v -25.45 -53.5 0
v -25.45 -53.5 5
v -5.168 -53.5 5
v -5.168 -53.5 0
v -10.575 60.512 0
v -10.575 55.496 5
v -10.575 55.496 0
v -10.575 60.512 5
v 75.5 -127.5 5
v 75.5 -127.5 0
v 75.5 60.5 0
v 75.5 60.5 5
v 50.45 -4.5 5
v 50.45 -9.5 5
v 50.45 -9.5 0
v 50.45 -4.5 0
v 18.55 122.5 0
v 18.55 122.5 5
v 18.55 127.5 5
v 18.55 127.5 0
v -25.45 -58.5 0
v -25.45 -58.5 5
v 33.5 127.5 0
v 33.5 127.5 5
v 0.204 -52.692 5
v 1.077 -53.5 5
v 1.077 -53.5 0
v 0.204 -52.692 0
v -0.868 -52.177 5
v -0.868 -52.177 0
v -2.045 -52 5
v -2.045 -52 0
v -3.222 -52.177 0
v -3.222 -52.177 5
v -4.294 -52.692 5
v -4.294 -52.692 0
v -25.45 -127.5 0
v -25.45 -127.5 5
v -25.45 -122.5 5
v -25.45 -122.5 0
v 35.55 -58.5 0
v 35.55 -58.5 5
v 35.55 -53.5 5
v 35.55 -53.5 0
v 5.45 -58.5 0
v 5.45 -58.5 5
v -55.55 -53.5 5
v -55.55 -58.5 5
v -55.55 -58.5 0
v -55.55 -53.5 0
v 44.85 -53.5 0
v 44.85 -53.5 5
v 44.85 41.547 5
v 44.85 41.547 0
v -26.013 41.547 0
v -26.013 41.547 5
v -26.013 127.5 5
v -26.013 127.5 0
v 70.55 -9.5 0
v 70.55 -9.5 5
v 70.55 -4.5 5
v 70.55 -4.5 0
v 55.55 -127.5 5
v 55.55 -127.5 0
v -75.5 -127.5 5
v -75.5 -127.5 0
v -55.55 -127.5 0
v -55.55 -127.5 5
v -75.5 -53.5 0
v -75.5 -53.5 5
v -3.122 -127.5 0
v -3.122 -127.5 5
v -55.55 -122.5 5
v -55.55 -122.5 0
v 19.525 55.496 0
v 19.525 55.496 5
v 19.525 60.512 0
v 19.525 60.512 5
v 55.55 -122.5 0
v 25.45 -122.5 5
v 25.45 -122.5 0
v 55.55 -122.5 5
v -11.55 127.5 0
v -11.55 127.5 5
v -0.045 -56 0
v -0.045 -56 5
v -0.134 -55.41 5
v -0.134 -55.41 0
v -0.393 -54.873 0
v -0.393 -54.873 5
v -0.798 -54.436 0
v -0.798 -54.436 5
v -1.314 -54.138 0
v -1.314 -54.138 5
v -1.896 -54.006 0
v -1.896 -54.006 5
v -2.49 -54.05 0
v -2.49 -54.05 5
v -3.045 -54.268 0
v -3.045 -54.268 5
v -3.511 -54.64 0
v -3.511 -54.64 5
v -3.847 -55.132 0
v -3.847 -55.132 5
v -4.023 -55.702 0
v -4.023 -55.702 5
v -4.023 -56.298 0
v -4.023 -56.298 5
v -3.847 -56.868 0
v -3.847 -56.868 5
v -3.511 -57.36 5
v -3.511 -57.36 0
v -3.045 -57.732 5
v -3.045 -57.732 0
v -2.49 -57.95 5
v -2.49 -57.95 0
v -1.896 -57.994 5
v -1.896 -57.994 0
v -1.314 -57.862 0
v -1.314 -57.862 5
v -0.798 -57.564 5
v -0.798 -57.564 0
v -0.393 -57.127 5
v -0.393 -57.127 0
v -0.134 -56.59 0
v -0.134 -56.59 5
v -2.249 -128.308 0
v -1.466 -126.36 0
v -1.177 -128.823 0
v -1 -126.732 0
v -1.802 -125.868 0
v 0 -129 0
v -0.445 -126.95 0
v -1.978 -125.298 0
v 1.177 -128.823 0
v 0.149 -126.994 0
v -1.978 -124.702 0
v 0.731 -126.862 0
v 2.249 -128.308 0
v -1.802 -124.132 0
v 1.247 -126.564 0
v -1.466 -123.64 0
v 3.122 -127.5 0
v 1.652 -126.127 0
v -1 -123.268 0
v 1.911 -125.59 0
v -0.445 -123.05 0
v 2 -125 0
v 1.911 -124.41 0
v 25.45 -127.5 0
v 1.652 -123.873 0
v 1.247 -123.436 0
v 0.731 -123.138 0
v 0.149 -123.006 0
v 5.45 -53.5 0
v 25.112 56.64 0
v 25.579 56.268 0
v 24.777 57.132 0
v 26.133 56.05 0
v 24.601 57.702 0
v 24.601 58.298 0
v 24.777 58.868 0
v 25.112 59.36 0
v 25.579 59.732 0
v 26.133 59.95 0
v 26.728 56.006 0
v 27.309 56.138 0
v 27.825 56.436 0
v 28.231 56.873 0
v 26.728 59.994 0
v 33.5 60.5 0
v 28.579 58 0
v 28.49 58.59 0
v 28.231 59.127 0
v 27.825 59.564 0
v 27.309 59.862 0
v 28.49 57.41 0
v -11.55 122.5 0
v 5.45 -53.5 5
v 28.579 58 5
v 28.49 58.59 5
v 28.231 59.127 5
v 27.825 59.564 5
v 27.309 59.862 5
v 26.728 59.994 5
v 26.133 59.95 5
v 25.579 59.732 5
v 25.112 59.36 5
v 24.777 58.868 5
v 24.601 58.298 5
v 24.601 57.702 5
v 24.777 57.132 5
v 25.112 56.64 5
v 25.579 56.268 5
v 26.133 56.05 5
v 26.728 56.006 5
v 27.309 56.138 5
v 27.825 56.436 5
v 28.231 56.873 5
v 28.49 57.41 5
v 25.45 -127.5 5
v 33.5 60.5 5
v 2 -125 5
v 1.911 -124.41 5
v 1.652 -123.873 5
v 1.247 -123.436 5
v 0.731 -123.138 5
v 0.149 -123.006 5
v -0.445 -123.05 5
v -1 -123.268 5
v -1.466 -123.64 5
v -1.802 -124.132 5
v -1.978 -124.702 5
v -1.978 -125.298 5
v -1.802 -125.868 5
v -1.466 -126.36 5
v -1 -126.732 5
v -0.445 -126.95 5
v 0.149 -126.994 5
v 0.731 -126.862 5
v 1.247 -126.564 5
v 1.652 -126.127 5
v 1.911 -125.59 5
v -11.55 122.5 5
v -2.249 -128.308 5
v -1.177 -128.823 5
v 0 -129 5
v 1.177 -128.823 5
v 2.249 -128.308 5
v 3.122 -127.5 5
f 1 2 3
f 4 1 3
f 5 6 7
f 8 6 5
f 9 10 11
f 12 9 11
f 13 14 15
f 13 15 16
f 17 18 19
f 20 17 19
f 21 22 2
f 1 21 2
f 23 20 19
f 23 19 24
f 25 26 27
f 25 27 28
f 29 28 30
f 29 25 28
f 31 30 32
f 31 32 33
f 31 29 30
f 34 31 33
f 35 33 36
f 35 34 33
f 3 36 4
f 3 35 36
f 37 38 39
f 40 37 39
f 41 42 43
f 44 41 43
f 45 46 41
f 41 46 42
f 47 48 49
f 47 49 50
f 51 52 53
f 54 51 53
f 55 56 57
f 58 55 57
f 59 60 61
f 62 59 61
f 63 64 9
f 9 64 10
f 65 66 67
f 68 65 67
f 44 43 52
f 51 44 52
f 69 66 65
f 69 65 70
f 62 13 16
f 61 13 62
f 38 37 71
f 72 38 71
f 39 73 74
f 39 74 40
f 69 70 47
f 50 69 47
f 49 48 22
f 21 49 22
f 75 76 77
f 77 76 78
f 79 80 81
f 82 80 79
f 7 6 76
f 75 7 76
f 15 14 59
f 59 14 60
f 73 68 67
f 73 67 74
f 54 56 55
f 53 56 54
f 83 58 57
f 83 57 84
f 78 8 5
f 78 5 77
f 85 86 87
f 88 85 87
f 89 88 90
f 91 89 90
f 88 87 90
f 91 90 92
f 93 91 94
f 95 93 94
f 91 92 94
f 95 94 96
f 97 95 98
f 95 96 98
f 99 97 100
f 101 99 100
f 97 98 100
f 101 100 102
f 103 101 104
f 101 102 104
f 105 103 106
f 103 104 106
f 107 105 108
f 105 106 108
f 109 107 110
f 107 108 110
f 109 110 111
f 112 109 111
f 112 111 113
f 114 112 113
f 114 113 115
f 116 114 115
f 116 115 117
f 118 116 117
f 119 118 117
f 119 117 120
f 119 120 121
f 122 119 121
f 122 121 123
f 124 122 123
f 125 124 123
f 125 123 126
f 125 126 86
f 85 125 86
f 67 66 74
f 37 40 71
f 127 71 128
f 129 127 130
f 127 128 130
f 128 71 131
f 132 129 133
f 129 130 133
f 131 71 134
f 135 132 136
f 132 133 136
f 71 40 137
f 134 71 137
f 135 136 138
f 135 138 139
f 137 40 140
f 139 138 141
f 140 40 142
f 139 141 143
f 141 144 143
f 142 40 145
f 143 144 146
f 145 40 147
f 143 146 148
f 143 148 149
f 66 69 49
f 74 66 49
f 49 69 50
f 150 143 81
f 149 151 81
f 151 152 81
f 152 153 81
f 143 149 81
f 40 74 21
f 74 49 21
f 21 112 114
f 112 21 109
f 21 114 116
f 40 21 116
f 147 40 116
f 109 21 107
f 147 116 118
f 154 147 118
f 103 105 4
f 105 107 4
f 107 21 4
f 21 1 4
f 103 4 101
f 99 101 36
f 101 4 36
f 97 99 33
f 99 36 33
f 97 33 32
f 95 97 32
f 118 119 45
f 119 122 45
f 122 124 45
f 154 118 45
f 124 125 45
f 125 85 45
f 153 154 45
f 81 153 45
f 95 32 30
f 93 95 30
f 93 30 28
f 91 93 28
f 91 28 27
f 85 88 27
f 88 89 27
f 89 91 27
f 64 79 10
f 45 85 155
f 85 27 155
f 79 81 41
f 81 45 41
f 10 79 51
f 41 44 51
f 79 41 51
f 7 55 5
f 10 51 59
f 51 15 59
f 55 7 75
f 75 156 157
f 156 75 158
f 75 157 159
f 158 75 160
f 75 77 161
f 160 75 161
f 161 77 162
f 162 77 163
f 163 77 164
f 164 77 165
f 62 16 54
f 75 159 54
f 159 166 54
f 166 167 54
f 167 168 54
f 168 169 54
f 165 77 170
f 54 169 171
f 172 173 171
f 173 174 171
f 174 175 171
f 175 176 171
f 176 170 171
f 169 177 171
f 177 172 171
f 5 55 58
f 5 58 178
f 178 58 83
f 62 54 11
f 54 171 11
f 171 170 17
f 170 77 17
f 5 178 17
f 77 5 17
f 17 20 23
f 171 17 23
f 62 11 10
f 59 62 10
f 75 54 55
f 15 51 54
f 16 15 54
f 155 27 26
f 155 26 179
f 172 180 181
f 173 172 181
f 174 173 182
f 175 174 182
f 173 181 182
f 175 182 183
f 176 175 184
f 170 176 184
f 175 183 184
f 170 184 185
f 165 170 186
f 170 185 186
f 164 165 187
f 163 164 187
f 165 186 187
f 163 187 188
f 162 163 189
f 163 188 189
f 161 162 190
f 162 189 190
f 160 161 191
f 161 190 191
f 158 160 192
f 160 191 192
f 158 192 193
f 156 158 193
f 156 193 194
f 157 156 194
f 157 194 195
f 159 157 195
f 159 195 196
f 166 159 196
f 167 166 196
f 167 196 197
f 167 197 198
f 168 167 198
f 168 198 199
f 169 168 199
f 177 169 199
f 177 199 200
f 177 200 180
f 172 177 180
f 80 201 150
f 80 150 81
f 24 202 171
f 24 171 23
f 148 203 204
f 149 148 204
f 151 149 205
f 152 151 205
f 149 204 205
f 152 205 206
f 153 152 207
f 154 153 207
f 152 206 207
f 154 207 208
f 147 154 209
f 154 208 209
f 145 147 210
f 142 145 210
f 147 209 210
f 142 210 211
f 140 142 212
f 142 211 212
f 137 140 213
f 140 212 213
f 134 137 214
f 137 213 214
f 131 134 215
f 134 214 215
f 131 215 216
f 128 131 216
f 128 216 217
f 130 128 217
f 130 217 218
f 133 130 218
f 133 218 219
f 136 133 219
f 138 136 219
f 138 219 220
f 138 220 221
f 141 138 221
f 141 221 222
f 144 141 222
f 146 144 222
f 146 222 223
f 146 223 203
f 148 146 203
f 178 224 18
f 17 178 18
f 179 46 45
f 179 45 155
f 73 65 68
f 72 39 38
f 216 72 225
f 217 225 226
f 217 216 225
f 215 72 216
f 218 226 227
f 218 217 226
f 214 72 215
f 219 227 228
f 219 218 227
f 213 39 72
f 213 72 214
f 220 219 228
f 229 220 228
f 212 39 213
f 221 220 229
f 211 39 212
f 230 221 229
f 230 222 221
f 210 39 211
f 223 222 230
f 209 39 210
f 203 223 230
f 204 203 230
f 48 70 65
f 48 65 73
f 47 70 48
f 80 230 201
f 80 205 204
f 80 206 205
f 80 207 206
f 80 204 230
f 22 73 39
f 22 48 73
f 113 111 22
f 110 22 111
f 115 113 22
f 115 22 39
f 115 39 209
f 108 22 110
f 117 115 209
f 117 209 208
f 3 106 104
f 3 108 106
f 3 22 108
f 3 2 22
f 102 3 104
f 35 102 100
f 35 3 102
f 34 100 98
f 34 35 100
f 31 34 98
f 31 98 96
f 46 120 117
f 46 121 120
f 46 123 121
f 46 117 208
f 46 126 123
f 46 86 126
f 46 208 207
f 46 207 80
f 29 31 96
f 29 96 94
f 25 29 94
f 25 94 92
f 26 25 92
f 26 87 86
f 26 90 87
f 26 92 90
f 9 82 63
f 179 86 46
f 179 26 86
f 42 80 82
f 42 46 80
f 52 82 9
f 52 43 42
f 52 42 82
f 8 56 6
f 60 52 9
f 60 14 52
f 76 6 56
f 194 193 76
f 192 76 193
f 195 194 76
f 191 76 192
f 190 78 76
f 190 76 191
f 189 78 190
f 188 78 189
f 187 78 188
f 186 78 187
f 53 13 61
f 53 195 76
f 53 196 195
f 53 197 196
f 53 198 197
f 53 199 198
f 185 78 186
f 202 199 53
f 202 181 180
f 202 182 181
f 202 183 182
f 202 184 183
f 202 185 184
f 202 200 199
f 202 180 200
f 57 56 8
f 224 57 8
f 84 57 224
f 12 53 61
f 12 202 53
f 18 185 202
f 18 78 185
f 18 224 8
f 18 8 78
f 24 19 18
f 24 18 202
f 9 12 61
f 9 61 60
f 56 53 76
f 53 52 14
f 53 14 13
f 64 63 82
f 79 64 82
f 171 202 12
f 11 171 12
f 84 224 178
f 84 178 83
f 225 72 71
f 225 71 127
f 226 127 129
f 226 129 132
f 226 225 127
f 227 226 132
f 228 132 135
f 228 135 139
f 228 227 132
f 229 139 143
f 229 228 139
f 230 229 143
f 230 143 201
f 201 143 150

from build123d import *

# Parameters (mm, degrees)
SKETCH1_W           = 151
SKETCH1_H           = 255
BOSS_EXTRUDE1_DEPTH = 5
SKETCH2_W           = 49.486524855
SKETCH2_H           = 99.222786378
CUT_EXTRUDE1_DEPTH  = 5
SKETCH3_W           = 42
SKETCH3_H           = 67
CUT_EXTRUDE2_DEPTH  = 5
SKETCH4_W           = 120.35
SKETCH4_H           = 95.04721362
CUT_EXTRUDE3_DEPTH  = 5
SKETCH5_W           = 30.1
SKETCH5_H           = 5
SKETCH5_W_2         = 20.1
SKETCH5_H_2         = 5.016666667
CUT_EXTRUDE4_DEPTH  = 5
SKETCH6_R           = 2
CUT_EXTRUDE5_DEPTH  = 10
SKETCH8_R           = 4
SKETCH8_R_2         = 2
BOSS_EXTRUDE2_DEPTH = 5


with BuildPart() as part:
    # Sketch1 → Boss-Extrude1 (new body)
    with BuildSketch(Plane.XY):
        Rectangle(SKETCH1_W, SKETCH1_H)
    extrude(amount=BOSS_EXTRUDE1_DEPTH)

    # Sketch2 → Cut-Extrude1 (cut)
    with BuildSketch(Plane.XY.offset(5)):
        with Locations((-50.756737573, 77.888606811)):
            Rectangle(SKETCH2_W, SKETCH2_H)
    extrude(amount=-CUT_EXTRUDE1_DEPTH, mode=Mode.SUBTRACT)

    # Sketch3 → Cut-Extrude2 (cut)
    with BuildSketch(Plane.XY.offset(5)):
        with Locations((54.5, 94)):
            Rectangle(SKETCH3_W, SKETCH3_H)
    extrude(amount=-CUT_EXTRUDE2_DEPTH, mode=Mode.SUBTRACT)

    # Sketch4 → Cut-Extrude3 (cut)
    with BuildSketch(Plane.XY.offset(5)):
        with Locations((-15.325, -5.976393188)):
            Rectangle(SKETCH4_W, SKETCH4_H)
    extrude(amount=-CUT_EXTRUDE3_DEPTH, mode=Mode.SUBTRACT)

    # Sketch5 → Cut-Extrude4 (cut)
    with BuildSketch(Plane.XY.offset(5)):
        with Locations((40.5, -125)):
            Rectangle(SKETCH5_W, SKETCH5_H)
        with Locations((-40.5, -125)):
            Rectangle(SKETCH5_W, SKETCH5_H)
        with Locations((20.5, -56)):
            Rectangle(SKETCH5_W, SKETCH5_H)
        with Locations((-40.5, -56)):
            Rectangle(SKETCH5_W, SKETCH5_H)
        with Locations((60.5, -7)):
            Rectangle(SKETCH5_W_2, SKETCH5_H)
        with Locations((4.475, 58.004166666)):
            Rectangle(SKETCH5_W, SKETCH5_H_2)
        with Locations((3.5, 125)):
            Rectangle(SKETCH5_W, SKETCH5_H)
    extrude(amount=-CUT_EXTRUDE4_DEPTH, mode=Mode.SUBTRACT)

    # Sketch6 → Cut-Extrude5 (cut)
    with BuildSketch(Plane.XY.offset(5)):
        with Locations((0, -125)):
            Circle(SKETCH6_R)
        with Locations((-2.045010771, -56)):
            Circle(SKETCH6_R)
        with Locations((26.57851787, 58)):
            Circle(SKETCH6_R)
    extrude(amount=-CUT_EXTRUDE5_DEPTH, mode=Mode.SUBTRACT)

    # Sketch8 → Boss-Extrude2 (add)
    with BuildSketch(Plane.XY.offset(5)):
        with Locations((0, -125)):
            Circle(SKETCH8_R)
        with Locations((0, -125)):
            Circle(SKETCH8_R_2, mode=Mode.SUBTRACT)
        with Locations((-2.045010771, -56)):
            Circle(SKETCH8_R)
        with Locations((-2.045010771, -56)):
            Circle(SKETCH8_R_2, mode=Mode.SUBTRACT)
    extrude(amount=-BOSS_EXTRUDE2_DEPTH)


solid = part.part
